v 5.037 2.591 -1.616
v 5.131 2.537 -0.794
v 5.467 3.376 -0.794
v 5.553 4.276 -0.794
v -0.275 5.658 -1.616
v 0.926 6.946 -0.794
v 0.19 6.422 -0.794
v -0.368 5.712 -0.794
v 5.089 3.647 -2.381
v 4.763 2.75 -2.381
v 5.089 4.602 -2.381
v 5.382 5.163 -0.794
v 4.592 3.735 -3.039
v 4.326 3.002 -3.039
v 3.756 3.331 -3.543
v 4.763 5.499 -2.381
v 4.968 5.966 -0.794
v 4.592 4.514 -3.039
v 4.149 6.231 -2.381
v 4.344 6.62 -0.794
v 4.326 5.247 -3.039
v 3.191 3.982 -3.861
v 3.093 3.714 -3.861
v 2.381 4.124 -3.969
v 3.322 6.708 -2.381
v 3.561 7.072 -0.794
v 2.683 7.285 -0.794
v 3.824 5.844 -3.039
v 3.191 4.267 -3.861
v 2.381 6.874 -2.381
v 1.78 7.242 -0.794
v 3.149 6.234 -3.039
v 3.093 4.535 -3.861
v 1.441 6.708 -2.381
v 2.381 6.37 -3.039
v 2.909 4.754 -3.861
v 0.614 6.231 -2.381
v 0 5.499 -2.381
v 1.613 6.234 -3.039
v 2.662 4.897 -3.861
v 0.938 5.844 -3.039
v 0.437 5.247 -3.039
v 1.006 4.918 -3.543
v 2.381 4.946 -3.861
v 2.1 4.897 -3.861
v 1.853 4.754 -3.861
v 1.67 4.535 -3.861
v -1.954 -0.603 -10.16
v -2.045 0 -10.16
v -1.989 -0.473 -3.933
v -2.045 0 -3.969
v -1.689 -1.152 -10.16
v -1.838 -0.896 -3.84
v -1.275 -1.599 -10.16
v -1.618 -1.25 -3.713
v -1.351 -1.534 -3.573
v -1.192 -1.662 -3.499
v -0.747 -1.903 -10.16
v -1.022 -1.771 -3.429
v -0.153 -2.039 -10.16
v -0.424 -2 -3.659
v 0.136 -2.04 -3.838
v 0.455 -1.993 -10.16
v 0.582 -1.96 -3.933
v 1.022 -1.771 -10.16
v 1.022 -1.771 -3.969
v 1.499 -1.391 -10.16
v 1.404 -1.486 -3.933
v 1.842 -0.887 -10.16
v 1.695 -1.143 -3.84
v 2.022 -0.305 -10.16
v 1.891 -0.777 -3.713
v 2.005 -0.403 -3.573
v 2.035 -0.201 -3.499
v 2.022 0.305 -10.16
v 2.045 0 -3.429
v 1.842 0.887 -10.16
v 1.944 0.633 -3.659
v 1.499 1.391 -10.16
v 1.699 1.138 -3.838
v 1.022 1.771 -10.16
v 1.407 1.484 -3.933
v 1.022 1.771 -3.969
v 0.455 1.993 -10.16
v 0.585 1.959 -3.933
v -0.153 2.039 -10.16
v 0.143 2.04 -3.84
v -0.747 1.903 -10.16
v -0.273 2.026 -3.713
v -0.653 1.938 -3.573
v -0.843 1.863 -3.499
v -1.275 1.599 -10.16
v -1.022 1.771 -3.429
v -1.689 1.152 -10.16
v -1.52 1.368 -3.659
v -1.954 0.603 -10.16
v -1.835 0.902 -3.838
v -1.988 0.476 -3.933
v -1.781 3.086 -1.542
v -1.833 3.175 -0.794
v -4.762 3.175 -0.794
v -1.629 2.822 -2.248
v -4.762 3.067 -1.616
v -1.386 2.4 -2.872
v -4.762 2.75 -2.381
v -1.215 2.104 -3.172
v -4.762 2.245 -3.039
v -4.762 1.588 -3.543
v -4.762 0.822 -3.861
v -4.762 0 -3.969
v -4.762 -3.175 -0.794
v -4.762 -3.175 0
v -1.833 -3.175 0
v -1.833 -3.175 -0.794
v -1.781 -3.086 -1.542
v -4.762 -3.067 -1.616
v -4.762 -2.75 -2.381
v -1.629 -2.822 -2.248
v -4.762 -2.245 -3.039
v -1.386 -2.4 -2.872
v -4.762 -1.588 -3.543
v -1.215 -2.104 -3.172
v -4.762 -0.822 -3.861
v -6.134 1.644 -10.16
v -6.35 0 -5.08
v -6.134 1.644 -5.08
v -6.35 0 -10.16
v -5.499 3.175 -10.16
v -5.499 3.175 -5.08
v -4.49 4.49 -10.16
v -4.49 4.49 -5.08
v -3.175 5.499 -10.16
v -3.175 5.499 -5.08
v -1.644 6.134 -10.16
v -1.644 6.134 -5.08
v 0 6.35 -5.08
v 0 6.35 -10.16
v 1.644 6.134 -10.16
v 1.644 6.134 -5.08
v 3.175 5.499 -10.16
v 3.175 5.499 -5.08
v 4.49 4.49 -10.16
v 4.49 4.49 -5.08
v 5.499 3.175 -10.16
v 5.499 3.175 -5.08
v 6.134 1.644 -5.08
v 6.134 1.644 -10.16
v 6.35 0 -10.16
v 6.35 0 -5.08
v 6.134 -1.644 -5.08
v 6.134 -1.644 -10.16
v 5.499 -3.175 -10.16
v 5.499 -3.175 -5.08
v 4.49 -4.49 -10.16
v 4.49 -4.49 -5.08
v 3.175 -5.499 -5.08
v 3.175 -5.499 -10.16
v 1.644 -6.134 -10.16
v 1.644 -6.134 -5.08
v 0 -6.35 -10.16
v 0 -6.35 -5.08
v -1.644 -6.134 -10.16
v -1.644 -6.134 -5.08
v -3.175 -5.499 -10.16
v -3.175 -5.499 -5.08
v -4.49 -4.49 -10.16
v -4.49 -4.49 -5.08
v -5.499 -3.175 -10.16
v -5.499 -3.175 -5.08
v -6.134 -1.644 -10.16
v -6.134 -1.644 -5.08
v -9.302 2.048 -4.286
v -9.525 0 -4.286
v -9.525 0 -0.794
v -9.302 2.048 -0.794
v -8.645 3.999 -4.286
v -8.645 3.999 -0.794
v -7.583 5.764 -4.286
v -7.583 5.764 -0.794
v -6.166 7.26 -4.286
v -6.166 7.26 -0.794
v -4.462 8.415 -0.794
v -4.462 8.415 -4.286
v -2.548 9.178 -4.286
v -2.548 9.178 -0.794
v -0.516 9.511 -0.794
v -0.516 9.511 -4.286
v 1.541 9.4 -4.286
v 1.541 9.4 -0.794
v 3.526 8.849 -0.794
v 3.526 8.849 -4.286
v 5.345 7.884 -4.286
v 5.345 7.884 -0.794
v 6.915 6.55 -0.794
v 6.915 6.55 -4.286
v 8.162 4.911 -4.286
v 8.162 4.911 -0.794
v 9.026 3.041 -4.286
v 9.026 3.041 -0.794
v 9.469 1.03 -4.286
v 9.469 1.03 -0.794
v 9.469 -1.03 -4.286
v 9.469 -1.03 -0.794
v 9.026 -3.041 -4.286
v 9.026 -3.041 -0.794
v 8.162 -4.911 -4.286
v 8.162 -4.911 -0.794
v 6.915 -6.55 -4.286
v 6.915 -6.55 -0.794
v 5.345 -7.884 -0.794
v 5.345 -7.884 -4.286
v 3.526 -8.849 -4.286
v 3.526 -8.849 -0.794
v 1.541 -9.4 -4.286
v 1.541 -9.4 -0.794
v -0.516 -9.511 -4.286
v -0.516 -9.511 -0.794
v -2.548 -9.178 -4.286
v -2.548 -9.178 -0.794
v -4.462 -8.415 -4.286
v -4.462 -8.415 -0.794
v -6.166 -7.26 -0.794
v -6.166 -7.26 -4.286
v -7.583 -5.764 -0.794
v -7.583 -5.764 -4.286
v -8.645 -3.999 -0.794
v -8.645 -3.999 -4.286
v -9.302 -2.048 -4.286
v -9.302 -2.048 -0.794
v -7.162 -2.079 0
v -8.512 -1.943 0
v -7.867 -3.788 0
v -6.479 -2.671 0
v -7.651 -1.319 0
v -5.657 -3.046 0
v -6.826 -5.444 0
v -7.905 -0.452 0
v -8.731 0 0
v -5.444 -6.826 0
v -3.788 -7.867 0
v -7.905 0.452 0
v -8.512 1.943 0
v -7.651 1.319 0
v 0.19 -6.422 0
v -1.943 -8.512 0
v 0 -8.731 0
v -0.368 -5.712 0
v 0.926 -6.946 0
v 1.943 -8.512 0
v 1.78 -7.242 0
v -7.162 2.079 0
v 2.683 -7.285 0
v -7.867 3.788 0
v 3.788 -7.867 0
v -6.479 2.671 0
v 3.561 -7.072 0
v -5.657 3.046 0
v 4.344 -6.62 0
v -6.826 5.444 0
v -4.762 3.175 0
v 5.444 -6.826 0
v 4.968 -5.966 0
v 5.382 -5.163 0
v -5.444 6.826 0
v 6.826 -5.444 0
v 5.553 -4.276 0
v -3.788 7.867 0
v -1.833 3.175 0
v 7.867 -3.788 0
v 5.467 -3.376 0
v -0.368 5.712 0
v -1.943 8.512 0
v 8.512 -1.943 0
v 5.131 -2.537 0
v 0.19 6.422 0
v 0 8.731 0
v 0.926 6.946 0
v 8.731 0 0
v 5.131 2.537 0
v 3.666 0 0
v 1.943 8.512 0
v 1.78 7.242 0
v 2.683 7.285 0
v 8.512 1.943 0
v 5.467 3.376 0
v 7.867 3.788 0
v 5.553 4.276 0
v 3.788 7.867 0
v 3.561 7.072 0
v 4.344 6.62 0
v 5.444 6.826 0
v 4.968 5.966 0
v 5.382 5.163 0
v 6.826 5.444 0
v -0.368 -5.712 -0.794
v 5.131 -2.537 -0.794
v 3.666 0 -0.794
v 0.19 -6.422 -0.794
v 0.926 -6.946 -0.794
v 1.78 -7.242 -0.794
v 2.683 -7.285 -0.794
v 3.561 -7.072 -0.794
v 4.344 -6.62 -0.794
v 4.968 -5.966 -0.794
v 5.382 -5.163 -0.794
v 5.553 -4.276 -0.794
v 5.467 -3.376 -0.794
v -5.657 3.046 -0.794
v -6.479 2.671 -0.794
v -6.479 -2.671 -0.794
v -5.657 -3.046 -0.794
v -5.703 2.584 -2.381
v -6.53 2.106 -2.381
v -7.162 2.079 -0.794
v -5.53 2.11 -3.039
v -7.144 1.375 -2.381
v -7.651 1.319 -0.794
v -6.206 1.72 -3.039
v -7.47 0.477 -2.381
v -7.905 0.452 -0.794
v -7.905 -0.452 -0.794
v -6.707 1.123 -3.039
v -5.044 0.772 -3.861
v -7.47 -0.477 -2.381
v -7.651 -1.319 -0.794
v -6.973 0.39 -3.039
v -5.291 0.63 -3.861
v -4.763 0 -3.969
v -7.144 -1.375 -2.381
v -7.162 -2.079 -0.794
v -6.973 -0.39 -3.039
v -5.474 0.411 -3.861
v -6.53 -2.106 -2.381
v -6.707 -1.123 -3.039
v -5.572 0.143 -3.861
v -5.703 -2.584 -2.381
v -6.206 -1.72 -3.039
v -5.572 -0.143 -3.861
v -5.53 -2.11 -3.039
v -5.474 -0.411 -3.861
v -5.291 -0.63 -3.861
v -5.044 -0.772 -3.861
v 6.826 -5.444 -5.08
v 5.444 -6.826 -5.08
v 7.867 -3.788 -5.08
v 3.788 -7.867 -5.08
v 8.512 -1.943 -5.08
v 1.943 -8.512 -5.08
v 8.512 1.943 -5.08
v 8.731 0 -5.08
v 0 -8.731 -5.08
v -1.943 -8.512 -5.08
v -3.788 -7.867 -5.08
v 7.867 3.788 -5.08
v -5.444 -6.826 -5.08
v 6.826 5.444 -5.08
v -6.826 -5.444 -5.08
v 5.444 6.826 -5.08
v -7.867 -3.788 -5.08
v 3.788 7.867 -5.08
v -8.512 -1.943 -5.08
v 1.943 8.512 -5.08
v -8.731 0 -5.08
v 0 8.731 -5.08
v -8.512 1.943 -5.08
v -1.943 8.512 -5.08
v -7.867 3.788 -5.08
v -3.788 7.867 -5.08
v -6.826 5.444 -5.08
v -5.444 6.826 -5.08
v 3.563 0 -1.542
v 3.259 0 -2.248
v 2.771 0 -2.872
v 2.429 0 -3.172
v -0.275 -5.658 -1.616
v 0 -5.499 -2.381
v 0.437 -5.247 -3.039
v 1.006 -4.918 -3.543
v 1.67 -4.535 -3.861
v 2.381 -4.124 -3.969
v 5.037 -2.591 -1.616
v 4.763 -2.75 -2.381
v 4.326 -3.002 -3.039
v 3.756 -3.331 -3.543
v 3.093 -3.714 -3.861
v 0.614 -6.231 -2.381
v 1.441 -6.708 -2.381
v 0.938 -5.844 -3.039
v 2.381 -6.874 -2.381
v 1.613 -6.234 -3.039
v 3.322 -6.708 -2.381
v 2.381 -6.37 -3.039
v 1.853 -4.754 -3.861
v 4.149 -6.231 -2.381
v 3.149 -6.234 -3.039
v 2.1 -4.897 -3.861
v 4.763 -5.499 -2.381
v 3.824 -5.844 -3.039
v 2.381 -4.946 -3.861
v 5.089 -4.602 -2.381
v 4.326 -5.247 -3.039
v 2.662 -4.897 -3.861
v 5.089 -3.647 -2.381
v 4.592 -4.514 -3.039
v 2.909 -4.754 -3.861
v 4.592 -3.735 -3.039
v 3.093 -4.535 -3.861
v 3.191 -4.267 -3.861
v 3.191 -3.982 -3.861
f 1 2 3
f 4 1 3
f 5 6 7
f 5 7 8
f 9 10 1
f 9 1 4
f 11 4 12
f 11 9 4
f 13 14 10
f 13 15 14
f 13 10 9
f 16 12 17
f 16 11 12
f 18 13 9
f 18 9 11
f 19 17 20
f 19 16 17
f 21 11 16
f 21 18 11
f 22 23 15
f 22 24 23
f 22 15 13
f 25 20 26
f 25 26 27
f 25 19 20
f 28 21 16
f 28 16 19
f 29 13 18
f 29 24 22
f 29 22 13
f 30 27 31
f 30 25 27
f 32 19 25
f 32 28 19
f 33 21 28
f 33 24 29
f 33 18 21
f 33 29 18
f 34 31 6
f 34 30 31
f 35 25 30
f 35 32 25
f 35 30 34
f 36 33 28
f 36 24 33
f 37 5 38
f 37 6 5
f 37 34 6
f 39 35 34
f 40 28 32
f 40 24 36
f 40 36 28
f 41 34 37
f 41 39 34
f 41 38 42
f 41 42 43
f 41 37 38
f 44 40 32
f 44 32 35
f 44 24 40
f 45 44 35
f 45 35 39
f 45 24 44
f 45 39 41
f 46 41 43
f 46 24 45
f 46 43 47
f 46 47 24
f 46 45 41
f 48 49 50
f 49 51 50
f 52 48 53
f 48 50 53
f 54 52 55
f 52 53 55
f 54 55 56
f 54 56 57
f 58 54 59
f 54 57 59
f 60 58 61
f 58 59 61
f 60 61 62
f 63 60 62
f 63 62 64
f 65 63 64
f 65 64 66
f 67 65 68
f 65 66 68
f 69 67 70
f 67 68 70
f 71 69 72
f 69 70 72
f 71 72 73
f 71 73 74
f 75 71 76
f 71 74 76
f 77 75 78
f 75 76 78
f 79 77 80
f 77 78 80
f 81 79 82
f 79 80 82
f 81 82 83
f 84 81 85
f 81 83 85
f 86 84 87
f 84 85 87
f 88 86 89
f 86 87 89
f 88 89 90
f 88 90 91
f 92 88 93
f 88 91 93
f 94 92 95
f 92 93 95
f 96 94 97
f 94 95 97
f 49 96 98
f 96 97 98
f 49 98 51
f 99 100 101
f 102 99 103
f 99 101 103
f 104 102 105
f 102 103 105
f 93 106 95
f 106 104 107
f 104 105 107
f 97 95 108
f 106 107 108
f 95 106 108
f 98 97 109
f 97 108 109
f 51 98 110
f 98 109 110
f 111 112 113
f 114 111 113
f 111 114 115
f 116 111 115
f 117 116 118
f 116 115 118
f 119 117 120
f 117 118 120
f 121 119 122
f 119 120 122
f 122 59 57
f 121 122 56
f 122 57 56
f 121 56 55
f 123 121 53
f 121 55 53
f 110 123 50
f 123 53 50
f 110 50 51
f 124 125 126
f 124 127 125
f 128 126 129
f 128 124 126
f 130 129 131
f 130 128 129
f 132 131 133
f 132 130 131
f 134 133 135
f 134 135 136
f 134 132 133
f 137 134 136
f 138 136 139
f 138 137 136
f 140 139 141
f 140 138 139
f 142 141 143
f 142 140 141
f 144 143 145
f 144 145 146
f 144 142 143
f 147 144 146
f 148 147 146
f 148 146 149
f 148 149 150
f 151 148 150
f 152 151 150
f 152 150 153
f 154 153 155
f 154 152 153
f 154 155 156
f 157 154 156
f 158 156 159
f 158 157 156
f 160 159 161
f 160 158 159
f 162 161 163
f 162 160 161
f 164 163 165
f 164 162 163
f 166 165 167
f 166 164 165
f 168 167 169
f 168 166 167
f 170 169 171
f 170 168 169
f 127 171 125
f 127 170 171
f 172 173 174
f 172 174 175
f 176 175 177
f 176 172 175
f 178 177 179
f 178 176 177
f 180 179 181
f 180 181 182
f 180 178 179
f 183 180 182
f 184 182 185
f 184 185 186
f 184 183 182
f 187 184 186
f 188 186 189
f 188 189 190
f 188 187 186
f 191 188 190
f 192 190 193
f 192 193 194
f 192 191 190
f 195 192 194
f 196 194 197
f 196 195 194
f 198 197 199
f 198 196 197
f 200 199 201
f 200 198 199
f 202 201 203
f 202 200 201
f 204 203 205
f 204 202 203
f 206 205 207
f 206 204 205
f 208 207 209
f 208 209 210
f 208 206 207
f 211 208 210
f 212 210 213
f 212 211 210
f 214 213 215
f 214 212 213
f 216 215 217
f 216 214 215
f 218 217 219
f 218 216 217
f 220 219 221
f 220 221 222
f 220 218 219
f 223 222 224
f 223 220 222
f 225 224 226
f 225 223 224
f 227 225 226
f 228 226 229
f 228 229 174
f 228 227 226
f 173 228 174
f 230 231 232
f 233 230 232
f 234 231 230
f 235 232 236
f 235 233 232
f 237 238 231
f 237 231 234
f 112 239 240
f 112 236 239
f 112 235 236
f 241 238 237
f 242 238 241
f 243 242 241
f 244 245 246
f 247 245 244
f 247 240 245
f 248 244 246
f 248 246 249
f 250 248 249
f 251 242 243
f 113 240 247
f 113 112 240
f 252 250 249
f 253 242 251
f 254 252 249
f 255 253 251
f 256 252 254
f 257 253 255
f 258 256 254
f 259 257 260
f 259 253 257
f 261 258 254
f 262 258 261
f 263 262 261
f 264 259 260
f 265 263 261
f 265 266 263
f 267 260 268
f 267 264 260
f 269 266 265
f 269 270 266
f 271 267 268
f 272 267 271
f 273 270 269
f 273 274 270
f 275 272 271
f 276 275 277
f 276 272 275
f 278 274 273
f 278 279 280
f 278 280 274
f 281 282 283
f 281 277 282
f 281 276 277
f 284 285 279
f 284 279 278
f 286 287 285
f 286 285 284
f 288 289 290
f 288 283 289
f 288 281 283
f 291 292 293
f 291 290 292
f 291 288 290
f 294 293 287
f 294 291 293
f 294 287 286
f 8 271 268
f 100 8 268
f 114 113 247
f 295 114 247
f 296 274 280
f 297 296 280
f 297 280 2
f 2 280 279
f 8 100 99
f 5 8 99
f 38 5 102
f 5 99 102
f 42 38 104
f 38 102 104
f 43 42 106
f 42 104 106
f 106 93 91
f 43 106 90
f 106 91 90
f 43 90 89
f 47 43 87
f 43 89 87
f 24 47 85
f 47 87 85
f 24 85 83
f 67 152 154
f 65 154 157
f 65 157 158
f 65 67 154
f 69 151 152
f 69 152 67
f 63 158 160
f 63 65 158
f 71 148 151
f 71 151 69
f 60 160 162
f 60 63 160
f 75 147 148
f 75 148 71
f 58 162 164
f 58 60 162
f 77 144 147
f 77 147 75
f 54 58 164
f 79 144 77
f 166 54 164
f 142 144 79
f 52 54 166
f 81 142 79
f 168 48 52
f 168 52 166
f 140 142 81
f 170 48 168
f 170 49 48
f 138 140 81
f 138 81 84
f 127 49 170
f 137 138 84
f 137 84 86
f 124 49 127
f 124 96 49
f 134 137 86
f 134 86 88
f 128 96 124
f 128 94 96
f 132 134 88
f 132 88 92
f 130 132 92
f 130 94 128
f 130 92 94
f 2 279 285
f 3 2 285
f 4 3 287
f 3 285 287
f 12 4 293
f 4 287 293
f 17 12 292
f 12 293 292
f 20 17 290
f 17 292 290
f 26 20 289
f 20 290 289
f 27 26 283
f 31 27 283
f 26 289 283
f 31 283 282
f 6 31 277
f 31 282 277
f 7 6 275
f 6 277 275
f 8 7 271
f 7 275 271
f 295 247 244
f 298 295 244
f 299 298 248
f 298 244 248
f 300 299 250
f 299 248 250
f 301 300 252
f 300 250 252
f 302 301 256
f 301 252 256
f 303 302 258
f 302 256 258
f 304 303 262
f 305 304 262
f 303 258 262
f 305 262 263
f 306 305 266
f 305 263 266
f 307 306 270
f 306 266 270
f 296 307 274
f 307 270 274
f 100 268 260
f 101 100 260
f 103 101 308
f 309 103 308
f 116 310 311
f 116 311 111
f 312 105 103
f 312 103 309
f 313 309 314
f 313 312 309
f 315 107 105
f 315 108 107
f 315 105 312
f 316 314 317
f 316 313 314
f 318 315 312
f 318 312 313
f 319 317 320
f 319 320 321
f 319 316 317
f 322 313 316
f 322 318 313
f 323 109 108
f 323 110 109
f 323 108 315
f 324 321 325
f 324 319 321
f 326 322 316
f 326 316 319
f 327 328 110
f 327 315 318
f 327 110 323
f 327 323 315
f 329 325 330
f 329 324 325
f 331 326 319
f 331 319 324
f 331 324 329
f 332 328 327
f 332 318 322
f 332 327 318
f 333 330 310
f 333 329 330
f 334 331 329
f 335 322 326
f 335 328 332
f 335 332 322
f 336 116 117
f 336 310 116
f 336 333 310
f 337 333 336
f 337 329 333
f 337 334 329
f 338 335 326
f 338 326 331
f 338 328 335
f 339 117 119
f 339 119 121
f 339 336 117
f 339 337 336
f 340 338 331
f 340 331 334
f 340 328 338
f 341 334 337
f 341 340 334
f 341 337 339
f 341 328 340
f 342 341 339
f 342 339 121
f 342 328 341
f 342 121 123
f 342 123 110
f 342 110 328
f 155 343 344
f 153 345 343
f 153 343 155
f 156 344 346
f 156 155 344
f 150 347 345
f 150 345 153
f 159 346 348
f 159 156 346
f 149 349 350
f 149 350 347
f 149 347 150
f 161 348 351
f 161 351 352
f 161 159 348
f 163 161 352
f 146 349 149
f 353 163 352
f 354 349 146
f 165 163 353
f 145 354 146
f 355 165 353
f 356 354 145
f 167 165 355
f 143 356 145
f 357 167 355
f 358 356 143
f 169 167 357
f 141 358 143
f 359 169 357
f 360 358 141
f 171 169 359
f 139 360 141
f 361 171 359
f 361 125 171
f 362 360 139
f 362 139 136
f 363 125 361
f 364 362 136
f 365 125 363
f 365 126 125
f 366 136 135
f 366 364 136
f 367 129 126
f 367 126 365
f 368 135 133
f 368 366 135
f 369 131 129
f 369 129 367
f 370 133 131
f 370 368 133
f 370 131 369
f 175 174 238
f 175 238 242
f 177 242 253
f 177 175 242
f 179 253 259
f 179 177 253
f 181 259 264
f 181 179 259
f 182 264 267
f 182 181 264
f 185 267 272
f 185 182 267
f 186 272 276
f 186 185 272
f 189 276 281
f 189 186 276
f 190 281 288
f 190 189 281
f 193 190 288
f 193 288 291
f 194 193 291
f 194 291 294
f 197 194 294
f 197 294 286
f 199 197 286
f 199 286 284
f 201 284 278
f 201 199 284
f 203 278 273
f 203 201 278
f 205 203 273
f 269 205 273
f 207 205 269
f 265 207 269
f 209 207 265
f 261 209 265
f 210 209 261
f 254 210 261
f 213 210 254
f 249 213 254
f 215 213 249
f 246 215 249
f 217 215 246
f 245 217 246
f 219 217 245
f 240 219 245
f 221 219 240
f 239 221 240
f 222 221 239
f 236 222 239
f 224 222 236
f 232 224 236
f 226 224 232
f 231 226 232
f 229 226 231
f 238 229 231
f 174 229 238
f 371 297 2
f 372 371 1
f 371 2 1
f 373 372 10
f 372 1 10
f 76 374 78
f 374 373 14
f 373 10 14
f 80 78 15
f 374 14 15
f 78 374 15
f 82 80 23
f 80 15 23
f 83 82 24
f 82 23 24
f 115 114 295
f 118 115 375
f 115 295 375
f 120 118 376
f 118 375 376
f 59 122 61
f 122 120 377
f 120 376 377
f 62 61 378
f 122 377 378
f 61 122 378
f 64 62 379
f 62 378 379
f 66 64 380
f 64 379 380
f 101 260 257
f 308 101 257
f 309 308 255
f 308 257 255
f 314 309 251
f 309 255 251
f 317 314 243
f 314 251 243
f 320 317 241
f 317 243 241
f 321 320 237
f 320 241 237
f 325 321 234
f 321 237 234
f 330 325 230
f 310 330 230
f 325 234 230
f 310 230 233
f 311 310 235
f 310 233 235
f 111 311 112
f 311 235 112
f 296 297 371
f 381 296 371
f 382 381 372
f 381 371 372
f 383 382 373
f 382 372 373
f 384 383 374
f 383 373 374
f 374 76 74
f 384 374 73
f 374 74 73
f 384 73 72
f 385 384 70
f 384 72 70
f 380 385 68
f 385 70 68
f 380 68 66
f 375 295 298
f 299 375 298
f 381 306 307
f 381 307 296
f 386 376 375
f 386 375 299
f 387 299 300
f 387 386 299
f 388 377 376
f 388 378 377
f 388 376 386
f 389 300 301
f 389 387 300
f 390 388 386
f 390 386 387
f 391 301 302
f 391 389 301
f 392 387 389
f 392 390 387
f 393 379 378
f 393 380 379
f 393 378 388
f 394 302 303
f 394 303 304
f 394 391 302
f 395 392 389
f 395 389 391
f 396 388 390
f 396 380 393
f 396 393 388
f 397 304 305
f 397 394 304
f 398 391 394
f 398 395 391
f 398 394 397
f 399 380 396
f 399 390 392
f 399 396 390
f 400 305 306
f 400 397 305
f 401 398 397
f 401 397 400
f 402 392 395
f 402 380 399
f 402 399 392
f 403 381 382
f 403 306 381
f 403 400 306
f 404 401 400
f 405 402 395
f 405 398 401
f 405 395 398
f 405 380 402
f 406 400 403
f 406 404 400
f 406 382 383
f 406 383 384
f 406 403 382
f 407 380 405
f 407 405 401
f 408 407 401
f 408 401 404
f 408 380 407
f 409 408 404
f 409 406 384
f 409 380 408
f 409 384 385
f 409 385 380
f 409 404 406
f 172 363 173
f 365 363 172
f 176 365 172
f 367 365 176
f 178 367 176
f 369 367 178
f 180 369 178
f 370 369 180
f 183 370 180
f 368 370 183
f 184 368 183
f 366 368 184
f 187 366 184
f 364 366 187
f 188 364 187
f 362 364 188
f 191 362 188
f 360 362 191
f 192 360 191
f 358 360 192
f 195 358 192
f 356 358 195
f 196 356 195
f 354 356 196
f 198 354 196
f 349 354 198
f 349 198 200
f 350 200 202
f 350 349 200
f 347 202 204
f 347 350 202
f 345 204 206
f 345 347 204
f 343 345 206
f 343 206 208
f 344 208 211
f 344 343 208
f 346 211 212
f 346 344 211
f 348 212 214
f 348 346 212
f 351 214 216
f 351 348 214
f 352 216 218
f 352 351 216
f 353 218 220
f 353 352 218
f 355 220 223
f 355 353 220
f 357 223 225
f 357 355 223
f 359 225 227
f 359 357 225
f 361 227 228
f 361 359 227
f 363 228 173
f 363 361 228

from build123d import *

# Parameters (mm, degrees)
F2_SIZE  = 0.79375
F4_DEPTH = 3.96875
F5_R     = 3.17499
F7_D     = 4.0894


# Not quite as in the source:
# - a fillet or chamfer is up to 0.001 mm smaller than in the source, because OpenCascade refuses the exact size


with BuildPart() as f1:
    # F0 (on Front) → F1 (revolve)
    with BuildSketch(Plane.XZ):
        Polygon((-6.35, -10.16), (0, -10.16), (0, 0), (-9.525, 0), (-9.525, -5.08), (-6.35, -5.08), align=None)
    revolve(axis=Axis((0, 0, -1.025330542), (0, 0, -1)))

    # F2
    f2_edges = [f1.edges().sort_by_distance(p)[0] for p in [
        (9.525, 0, 0),
        (9.525, 0, -5.08),
    ]]
    chamfer(f2_edges, length=F2_SIZE)

    # F3 (on face) → F4 (cut)
    with BuildSketch(Plane.XY):
        with BuildLine():
            Line((-4.7625, -3.175), (-1.8330871047, -3.175))
            Line((-1.8330871047, -3.175), (-0.368380657, -5.7119459855))
            ThreePointArc((-0.368380657, -5.7119459855), (3.96875, -6.8740766425), (5.130880657, -2.5369459855))
            Line((5.130880657, -2.5369459855), (3.6661742094, 0))
            Line((3.6661742094, 0), (5.130880657, 2.5369459855))
            ThreePointArc((5.130880657, 2.5369459855), (3.96875, 6.8740766425), (-0.368380657, 5.7119459855))
            Line((-0.368380657, 5.7119459855), (-1.8330871047, 3.175))
            Line((-1.8330871047, 3.175), (-4.7625, 3.175))
            ThreePointArc((-4.7625, 3.175), (-7.9375, 0), (-4.7625, -3.175))
        make_face()
    extrude(amount=-F4_DEPTH, mode=Mode.SUBTRACT)

    # F5 (radius 3.175 in the source; OpenCascade refuses exactly that, so slightly less here)
    f5_edges = [f1.edges().sort_by_distance(p)[0] for p in [
        (3.96875, 6.874077, -3.96875),
        (-1.100734, 4.443473, -3.96875),
        (-3.297794, 3.175, -3.96875),
        (-7.9375, 0, -3.96875),
        (-3.297794, -3.175, -3.96875),
        (-1.100734, -4.443473, -3.96875),
        (3.96875, -6.874077, -3.96875),
        (4.398527, -1.268473, -3.96875),
        (4.398527, 1.268473, -3.96875),
    ]]
    fillet(f5_edges, radius=F5_R)

    # F7 (through all)
    with Locations(Plane(origin=(0, 0, -10.16), x_dir=(1, 0, 0), z_dir=(0, 0, -1))):
        with Locations((0, 0)):
            Hole(F7_D / 2)


solid = f1.part
